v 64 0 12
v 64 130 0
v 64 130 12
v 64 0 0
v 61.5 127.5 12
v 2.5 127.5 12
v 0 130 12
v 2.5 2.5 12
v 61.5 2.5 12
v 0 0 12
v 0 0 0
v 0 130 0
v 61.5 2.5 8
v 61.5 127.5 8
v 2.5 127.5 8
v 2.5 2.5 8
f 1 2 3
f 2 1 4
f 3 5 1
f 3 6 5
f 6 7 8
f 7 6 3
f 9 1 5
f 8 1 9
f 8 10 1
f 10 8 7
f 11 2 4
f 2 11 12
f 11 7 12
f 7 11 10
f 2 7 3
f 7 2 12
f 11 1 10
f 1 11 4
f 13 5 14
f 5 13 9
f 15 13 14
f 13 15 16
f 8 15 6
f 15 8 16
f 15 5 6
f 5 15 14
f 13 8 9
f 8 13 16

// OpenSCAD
//59mm x 125mm x 7.74mm



difference(){
cube([64,130,12]);


translate([2.5,2.5,8])
cube([59,125,8]);
}
